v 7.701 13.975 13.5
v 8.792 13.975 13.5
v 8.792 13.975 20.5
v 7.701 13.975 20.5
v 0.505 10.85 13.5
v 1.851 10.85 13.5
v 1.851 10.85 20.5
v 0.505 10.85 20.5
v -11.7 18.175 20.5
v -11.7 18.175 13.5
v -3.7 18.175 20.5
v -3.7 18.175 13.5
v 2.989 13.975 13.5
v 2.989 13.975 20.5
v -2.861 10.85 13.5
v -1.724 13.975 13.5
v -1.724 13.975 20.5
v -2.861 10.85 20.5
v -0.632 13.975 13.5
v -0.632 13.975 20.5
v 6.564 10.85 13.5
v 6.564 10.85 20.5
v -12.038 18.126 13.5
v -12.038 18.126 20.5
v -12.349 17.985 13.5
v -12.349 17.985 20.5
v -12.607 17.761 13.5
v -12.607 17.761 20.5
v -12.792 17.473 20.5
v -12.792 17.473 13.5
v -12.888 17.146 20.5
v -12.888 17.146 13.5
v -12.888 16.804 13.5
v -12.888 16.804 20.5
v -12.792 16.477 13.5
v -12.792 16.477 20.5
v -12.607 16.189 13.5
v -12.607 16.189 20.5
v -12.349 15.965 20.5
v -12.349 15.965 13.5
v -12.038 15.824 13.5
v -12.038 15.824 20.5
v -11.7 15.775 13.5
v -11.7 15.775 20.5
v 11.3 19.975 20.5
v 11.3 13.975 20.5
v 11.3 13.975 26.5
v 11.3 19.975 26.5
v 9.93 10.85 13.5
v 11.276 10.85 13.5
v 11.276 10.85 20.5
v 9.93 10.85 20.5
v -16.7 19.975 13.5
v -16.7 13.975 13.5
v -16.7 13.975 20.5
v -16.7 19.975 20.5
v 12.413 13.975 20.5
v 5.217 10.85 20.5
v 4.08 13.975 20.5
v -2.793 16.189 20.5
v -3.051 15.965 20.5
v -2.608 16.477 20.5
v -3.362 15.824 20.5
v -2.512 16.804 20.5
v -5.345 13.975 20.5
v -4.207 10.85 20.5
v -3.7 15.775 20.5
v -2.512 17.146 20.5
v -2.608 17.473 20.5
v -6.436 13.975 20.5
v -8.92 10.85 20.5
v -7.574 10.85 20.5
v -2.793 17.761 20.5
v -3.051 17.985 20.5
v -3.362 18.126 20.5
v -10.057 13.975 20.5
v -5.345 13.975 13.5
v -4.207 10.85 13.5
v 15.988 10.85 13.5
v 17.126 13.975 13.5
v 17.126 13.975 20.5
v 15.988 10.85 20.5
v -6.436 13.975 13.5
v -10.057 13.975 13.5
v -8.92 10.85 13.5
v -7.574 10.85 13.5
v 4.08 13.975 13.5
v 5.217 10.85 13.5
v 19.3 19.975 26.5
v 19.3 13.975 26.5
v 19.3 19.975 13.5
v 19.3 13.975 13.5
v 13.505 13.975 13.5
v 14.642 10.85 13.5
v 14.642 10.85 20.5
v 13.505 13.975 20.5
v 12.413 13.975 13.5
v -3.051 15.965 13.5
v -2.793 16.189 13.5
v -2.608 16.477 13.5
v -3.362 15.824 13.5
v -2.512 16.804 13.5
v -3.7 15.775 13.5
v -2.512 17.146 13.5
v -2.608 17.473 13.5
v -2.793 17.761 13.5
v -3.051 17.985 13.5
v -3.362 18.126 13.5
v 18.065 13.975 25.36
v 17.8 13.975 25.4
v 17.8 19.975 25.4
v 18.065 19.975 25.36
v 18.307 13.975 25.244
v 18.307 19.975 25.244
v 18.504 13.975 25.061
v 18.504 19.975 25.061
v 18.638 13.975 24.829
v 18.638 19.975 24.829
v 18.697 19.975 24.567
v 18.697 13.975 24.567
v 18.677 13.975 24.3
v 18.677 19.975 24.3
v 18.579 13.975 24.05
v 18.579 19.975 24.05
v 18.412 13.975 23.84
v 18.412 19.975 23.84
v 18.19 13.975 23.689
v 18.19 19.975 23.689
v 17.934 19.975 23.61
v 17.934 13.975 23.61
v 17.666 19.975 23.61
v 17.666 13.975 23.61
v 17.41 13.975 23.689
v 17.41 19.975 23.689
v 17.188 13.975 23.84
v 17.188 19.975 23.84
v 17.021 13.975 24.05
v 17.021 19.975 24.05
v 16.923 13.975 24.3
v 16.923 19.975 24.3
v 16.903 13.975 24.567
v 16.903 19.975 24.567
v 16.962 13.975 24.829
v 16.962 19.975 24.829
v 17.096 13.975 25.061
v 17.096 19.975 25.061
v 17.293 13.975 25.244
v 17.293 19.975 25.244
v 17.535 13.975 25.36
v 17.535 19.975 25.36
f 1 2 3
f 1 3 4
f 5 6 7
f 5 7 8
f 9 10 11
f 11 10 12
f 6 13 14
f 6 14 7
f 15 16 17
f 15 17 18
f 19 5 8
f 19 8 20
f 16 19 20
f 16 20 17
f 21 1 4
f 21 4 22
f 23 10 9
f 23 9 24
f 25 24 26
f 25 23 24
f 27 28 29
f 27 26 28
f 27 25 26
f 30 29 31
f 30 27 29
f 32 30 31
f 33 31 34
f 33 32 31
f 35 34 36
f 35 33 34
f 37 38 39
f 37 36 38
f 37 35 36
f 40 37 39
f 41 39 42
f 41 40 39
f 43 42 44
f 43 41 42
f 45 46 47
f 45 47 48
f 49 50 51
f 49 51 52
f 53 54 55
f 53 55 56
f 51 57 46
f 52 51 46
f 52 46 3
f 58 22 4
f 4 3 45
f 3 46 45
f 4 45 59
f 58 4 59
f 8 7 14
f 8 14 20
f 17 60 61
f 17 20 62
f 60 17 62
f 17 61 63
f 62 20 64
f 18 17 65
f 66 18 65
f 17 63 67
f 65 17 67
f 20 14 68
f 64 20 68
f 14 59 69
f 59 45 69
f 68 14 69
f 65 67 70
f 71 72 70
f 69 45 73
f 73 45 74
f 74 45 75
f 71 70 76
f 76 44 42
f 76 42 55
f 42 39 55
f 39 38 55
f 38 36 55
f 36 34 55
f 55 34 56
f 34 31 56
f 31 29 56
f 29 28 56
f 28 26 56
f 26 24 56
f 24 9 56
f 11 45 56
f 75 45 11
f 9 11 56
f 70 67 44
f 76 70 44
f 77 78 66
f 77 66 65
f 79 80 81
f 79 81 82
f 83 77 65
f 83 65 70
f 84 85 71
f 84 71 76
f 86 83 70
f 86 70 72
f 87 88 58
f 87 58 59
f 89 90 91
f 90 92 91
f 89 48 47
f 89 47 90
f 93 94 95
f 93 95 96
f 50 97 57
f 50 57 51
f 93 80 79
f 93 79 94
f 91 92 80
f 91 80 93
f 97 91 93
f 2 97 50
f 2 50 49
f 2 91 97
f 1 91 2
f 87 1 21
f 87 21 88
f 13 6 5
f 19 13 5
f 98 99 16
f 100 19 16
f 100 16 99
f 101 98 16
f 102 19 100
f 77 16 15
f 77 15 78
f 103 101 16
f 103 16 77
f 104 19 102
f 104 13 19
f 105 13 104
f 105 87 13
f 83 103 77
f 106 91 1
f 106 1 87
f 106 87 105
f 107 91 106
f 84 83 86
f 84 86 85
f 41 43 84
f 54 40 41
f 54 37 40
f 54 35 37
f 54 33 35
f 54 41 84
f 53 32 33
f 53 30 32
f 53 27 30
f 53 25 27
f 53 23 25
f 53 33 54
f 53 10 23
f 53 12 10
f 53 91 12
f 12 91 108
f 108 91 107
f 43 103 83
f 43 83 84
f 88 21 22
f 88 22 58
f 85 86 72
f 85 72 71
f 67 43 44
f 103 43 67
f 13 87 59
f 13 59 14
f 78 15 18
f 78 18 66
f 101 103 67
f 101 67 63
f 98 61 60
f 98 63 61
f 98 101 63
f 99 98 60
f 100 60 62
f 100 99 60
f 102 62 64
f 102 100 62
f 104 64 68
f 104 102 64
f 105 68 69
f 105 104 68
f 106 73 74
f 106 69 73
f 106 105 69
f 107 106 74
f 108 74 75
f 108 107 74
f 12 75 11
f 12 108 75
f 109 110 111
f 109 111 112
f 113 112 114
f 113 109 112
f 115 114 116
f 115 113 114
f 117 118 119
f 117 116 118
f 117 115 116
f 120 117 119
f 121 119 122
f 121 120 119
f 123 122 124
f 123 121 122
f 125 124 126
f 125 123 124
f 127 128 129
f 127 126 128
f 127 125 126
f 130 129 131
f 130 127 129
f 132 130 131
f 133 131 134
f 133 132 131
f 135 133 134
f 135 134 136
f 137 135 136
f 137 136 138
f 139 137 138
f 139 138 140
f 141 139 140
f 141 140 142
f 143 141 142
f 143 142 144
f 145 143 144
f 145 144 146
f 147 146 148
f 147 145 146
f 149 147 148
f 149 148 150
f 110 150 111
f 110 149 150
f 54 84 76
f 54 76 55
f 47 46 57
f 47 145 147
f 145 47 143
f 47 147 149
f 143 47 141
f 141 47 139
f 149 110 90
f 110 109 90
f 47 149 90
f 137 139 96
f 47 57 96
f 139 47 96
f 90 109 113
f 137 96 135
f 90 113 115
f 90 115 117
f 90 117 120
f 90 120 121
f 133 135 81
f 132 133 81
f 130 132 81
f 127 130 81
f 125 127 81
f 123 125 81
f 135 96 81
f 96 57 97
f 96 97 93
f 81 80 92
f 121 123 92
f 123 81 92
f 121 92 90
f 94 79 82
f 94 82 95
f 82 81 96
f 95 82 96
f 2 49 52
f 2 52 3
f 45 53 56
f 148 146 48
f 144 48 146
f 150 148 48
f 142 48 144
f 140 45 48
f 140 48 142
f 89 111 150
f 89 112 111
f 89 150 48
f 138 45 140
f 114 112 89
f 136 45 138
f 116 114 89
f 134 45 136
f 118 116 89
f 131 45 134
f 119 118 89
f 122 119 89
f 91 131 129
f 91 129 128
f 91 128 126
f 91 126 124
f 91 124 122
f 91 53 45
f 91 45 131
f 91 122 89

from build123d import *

# Parameters (mm, degrees)
BOSS_EXTRUDE1_START     = 13.5
BOSS_EXTRUDE1_DEPTH     = 7
BOSS_EXTRUDE2_START     = 20.5
SKETCH2_W               = 8
SKETCH2_H               = 6
BOSS_EXTRUDE2_DEPTH     = 6
CUT_EXTRUDE1_DEPTH      = 39.389329572
CUT_EXTRUDE1_DEPTH_BACK = 39.389329572
SKETCH3_R               = 0.9
CUT_EXTRUDE2_DEPTH      = 39.389329572
CUT_EXTRUDE2_DEPTH_BACK = 39.389329572
SKETCH4_W               = 8
SKETCH4_H               = 2.4
CUT_EXTRUDE3_DEPTH      = 39.389329572
CUT_EXTRUDE3_DEPTH_BACK = 39.389329572
SKETCH5_R               = 1.2


with BuildPart() as part:
    # Sketch1 → Boss-Extrude1 (new body)
    with BuildSketch(Plane.XY.offset(BOSS_EXTRUDE1_START)):
        Polygon((-16.7, 19.975), (19.3, 19.975), (19.3, 13.975), (17.125805621, 13.975), (15.988398639, 10.85), (14.642129734, 10.85), (13.504722752, 13.975), (12.41341664, 13.975), (11.276009658, 10.85), (9.929740754, 10.85), (8.792333772, 13.975), (7.70102766, 13.975), (6.563620678, 10.85), (5.217351773, 10.85), (4.079944791, 13.975), (2.988638679, 13.975), (1.851231697, 10.85), (0.504962793, 10.85), (-0.632444189, 13.975), (-1.723750301, 13.975), (-2.861157283, 10.85), (-4.207426188, 10.85), (-5.34483317, 13.975), (-6.436139281, 13.975), (-7.573546263, 10.85), (-8.919815168, 10.85), (-10.05722215, 13.975), (-16.7, 13.975), align=None)
    extrude(amount=BOSS_EXTRUDE1_DEPTH)

    # Sketch2 → Boss-Extrude2 (add)
    with BuildSketch(Plane.XY.offset(BOSS_EXTRUDE2_START)):
        with Locations((15.3, 16.975)):
            Rectangle(SKETCH2_W, SKETCH2_H)
    extrude(amount=BOSS_EXTRUDE2_DEPTH)

    # Sketch3 → Cut-Extrude1 (cut, two sides: drawn at the far end of the back side and taken through both)
    with BuildSketch(Plane(origin=(0, 0, 0), x_dir=(1, 0, 0), z_dir=(0, 1, 0)).offset(-CUT_EXTRUDE1_DEPTH_BACK)):
        with Locations(Location((17.8, -24.5, 0), (0, 0, 270))):
            Circle(SKETCH3_R)
    extrude(amount=CUT_EXTRUDE1_DEPTH + CUT_EXTRUDE1_DEPTH_BACK, mode=Mode.SUBTRACT)

    # Sketch4 → Cut-Extrude2 (cut, two sides: drawn at the far end of the back side and taken through both)
    with BuildSketch(Plane.XY.offset(-CUT_EXTRUDE2_DEPTH_BACK)):
        with Locations((-7.7, 16.975)):
            Rectangle(SKETCH4_W, SKETCH4_H)
    extrude(amount=CUT_EXTRUDE2_DEPTH + CUT_EXTRUDE2_DEPTH_BACK, mode=Mode.SUBTRACT)

    # Sketch5 → Cut-Extrude3 (cut, two sides: drawn at the far end of the back side and taken through both)
    with BuildSketch(Plane.XY.offset(-CUT_EXTRUDE3_DEPTH_BACK)):
        with Locations((-11.7, 16.975)):
            Circle(SKETCH5_R)
        with Locations((-3.7, 16.975)):
            Circle(SKETCH5_R)
    extrude(amount=CUT_EXTRUDE3_DEPTH + CUT_EXTRUDE3_DEPTH_BACK, mode=Mode.SUBTRACT)


solid = part.part
